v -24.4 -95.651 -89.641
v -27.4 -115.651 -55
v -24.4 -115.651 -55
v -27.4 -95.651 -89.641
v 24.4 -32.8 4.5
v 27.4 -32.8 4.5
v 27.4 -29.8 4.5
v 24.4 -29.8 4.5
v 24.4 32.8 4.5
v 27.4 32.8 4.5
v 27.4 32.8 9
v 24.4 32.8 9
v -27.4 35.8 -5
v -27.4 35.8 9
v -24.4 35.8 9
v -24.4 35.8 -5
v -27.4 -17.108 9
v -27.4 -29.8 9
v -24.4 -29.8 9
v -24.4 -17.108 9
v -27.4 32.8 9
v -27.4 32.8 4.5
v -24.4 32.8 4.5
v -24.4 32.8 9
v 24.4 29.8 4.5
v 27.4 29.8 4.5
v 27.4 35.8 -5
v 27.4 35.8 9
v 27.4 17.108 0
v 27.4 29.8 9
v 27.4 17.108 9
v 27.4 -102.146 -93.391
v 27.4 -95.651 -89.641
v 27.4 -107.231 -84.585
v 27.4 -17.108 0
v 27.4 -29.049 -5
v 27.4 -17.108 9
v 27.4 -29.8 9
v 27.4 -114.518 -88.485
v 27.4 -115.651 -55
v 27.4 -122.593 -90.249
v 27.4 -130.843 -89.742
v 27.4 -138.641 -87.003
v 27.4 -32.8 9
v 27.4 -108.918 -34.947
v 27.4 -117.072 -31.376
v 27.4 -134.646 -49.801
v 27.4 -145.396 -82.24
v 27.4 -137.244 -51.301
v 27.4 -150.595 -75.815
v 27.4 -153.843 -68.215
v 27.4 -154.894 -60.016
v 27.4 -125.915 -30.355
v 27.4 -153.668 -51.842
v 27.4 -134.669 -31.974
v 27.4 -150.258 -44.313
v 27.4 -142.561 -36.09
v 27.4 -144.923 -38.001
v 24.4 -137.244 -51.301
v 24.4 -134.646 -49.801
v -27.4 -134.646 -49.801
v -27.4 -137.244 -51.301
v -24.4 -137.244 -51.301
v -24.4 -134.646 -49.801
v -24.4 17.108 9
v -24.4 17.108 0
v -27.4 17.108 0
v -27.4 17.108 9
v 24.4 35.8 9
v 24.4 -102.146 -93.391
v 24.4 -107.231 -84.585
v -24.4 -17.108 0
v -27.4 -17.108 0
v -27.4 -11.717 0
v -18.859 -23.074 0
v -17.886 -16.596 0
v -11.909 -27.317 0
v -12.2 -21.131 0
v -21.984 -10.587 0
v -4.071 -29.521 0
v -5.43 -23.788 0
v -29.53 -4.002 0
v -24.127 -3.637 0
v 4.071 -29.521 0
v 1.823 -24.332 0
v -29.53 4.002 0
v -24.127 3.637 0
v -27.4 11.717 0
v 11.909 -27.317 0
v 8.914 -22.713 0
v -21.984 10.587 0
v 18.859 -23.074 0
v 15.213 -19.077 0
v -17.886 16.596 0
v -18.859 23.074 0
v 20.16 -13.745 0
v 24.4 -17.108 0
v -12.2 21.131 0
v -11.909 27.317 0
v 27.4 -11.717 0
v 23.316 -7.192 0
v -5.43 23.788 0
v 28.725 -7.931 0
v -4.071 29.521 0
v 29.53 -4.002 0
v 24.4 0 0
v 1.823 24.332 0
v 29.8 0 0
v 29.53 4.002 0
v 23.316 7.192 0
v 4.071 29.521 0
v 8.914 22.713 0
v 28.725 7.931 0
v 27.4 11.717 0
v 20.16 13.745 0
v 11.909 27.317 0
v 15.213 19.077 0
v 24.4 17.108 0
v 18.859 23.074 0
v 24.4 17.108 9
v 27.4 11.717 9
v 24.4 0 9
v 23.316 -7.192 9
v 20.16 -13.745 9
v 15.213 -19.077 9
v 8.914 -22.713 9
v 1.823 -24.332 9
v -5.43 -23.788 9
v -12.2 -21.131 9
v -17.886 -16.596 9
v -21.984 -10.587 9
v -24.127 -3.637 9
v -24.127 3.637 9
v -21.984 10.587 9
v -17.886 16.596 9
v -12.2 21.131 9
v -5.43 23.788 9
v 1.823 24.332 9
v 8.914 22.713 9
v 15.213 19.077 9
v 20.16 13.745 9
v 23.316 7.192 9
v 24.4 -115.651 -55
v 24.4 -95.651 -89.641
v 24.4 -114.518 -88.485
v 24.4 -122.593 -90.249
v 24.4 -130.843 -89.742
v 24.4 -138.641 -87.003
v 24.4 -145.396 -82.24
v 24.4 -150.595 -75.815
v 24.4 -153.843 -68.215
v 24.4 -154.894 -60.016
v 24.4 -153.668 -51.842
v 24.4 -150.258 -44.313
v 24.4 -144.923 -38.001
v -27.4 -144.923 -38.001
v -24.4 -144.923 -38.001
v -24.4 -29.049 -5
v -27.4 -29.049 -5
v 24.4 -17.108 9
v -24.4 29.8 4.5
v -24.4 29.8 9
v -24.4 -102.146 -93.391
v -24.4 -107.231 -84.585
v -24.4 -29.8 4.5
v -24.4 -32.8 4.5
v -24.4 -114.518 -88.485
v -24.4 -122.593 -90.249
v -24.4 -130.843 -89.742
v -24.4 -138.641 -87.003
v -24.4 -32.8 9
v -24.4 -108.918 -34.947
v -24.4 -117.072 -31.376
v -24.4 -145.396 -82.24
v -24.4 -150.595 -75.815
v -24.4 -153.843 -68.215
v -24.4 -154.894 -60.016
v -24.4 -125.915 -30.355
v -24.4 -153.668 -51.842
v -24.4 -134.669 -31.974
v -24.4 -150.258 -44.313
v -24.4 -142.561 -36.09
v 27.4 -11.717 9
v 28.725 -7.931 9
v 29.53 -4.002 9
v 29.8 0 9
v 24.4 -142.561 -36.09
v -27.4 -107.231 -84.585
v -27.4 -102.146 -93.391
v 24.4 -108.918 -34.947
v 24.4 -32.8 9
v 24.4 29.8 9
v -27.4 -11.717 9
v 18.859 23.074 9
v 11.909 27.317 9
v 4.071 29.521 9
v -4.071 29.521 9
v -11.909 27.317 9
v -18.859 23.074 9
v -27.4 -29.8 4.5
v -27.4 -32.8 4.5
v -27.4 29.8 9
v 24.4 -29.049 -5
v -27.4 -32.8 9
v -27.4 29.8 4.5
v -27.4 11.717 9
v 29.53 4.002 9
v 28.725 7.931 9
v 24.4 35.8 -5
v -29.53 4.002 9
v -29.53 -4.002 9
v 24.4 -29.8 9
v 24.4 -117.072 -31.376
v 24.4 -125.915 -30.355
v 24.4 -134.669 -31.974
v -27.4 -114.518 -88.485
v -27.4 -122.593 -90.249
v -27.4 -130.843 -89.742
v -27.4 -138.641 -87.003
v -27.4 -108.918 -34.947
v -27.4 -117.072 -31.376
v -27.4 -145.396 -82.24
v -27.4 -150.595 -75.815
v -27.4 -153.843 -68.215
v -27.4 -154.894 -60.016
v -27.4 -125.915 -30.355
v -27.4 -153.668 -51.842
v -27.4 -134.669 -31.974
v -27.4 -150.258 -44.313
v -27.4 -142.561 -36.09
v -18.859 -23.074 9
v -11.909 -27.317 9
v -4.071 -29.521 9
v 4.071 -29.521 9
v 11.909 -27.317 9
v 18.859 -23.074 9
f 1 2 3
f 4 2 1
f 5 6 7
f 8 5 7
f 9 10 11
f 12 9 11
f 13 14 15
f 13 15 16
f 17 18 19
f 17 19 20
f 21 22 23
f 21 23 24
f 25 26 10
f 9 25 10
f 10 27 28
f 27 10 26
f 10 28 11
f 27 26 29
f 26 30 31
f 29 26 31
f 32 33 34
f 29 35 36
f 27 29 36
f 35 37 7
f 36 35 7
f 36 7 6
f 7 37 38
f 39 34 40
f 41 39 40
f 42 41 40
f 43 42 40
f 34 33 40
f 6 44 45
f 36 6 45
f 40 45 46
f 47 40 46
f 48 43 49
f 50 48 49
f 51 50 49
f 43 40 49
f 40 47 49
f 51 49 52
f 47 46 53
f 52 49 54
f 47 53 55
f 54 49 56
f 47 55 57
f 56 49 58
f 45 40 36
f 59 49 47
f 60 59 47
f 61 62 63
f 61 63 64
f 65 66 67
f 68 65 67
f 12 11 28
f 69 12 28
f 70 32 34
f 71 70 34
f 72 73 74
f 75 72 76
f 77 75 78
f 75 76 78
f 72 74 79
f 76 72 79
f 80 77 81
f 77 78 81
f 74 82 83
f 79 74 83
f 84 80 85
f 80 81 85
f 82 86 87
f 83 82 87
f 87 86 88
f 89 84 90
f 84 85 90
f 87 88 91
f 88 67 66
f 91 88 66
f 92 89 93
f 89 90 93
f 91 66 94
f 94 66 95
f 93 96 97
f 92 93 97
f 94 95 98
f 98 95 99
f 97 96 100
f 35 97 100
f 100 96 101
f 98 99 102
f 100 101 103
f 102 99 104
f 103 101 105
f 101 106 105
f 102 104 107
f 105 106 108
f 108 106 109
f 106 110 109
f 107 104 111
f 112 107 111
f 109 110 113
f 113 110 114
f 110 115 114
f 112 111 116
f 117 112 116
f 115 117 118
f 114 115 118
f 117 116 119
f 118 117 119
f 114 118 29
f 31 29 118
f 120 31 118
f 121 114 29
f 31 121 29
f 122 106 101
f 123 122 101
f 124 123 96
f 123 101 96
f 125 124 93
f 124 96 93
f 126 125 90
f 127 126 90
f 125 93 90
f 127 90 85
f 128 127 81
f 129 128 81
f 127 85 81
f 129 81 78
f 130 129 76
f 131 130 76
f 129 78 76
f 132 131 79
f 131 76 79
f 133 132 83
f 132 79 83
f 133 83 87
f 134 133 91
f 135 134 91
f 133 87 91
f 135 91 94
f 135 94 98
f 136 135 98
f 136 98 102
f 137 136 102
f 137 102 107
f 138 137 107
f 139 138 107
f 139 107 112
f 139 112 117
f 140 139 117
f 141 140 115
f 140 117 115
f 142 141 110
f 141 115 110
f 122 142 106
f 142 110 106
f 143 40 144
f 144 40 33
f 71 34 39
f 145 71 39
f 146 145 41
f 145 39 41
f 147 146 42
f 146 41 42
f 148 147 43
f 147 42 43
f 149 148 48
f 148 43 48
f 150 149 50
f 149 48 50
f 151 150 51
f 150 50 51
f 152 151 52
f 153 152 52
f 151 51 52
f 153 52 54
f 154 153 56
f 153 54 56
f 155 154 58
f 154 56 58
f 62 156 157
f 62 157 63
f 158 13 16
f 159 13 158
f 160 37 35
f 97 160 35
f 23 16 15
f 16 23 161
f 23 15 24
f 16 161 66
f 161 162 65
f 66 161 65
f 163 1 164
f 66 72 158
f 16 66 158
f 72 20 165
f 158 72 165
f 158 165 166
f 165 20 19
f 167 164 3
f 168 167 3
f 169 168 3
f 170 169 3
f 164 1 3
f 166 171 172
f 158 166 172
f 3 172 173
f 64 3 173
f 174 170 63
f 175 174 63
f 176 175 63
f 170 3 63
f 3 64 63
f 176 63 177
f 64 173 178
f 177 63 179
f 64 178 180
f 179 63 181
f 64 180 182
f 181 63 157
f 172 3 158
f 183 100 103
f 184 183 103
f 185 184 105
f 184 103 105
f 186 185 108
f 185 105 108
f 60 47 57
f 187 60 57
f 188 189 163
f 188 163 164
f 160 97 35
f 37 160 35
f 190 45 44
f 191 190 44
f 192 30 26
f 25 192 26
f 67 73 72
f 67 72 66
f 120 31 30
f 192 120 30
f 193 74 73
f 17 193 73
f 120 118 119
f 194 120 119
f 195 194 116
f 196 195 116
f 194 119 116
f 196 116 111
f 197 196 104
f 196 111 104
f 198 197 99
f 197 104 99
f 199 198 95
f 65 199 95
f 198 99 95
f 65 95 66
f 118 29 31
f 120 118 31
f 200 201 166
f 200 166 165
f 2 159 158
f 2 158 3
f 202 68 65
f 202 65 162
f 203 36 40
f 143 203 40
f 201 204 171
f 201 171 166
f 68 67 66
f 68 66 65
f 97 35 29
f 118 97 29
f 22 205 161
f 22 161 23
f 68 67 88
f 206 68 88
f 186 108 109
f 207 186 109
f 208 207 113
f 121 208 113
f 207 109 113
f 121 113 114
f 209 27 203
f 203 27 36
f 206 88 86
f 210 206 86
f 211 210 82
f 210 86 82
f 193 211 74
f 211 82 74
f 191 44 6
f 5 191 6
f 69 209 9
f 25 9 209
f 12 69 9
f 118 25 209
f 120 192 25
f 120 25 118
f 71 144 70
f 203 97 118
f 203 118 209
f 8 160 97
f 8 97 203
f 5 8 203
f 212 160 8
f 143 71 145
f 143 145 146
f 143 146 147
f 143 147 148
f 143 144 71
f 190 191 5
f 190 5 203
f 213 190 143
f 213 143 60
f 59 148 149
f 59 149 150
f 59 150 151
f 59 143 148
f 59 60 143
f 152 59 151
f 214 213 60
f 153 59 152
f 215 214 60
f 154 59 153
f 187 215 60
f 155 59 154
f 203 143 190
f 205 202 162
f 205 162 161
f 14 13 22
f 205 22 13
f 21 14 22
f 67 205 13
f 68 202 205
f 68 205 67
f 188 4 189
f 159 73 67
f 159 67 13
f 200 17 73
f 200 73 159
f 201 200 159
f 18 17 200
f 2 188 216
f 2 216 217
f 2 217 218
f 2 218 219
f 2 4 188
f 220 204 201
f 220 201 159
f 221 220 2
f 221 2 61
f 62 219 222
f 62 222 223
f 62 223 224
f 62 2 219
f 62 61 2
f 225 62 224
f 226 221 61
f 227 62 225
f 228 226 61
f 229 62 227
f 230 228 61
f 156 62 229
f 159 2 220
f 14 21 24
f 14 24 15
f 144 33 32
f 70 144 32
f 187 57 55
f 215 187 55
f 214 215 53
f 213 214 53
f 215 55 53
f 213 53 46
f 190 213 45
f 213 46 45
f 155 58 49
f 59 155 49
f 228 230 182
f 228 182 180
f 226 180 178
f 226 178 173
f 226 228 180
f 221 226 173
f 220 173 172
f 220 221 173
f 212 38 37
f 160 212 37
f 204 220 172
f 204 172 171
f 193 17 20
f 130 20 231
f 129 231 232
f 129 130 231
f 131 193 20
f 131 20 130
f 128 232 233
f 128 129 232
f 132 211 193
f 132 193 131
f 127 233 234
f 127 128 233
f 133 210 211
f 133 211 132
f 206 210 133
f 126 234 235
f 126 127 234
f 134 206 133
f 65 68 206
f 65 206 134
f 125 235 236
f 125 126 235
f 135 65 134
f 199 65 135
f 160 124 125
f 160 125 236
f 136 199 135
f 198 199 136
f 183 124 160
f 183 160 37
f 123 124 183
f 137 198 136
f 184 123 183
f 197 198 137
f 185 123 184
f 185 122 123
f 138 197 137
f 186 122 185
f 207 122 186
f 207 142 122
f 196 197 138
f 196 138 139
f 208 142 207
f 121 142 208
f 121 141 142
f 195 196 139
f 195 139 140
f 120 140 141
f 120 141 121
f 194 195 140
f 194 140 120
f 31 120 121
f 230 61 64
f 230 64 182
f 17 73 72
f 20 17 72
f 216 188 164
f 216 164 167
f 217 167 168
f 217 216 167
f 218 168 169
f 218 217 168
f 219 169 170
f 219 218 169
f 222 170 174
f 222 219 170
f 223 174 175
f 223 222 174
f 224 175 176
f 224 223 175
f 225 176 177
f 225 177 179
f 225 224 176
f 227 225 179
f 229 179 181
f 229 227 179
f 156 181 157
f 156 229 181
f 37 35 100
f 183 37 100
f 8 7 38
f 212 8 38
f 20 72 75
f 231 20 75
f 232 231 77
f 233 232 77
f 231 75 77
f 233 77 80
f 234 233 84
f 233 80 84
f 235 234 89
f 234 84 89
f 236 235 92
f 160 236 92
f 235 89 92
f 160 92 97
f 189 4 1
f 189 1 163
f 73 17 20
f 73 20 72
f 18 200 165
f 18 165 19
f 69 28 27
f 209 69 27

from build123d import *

# Parameters (mm, degrees)
F2_DEPTH = 9
F4_DEPTH = 3


with BuildPart() as f2:
    # F1 (on Top) → F2 (new body)
    with BuildSketch(Plane.XY):
        with BuildLine():
            Line((24.4, 0), (24.4, 17.1078929153))
            ThreePointArc((24.4, 17.1078929153), (0, 29.8), (-24.4, 17.1078929153))
            Line((-24.4, 17.1078929153), (-24.4, 0))
            ThreePointArc((-24.4, 0), (0, 24.4), (24.4, 0))
        make_face()
        with BuildLine():
            Line((27.4, 17.1078929153), (24.4, 17.1078929153))
            ThreePointArc((24.4, 17.1078929153), (26.0398994251, 14.4901220813), (27.4, 11.7166548127))
            Line((27.4, 11.7166548127), (27.4, 17.1078929153))
        make_face()
        with BuildLine():
            ThreePointArc((27.4, 11.7166548127), (26.0398994251, 14.4901220813), (24.4, 17.1078929153))
            Line((24.4, 17.1078929153), (24.4, 0))
            Line((24.4, 0), (24.4, -17.1078929153))
            ThreePointArc((24.4, -17.1078929153), (26.0398994251, -14.4901220813), (27.4, -11.7166548127))
            Line((27.4, -11.7166548127), (27.4, 11.7166548127))
        make_face()
        with BuildLine():
            Line((-24.4, 0), (-24.4, 17.1078929153))
            ThreePointArc((-24.4, 17.1078929153), (-26.0398994251, 14.4901220813), (-27.4, 11.7166548127))
            Line((-27.4, 11.7166548127), (-27.4, -11.7166548127))
            ThreePointArc((-27.4, -11.7166548127), (-26.0398994251, -14.4901220813), (-24.4, -17.1078929153))
            Line((-24.4, -17.1078929153), (-24.4, 0))
        make_face()
        with BuildLine():
            ThreePointArc((-27.4, 11.7166548127), (-26.0398994251, 14.4901220813), (-24.4, 17.1078929153))
            Line((-24.4, 17.1078929153), (-27.4, 17.1078929153))
            Line((-27.4, 17.1078929153), (-27.4, 11.7166548127))
        make_face()
        with BuildLine():
            ThreePointArc((29.8, 0), (29.1938349656, 5.9799665551), (27.4, 11.7166548127))
            Line((27.4, 11.7166548127), (27.4, -11.7166548127))
            ThreePointArc((27.4, -11.7166548127), (29.1938349656, -5.9799665551), (29.8, 0))
        make_face()
        with BuildLine():
            Line((24.4, -17.1078929153), (24.4, 0))
            ThreePointArc((24.4, 0), (0, -24.4), (-24.4, 0))
            Line((-24.4, 0), (-24.4, -17.1078929153))
            ThreePointArc((-24.4, -17.1078929153), (0, -29.8), (24.4, -17.1078929153))
        make_face()
        with BuildLine():
            Line((-27.4, -11.7166548127), (-27.4, 11.7166548127))
            ThreePointArc((-27.4, 11.7166548127), (-29.8, 0), (-27.4, -11.7166548127))
        make_face()
        with BuildLine():
            Line((27.4, -17.1078929153), (27.4, -11.7166548127))
            ThreePointArc((27.4, -11.7166548127), (26.0398994251, -14.4901220813), (24.4, -17.1078929153))
            Line((24.4, -17.1078929153), (27.4, -17.1078929153))
        make_face()
        with BuildLine():
            ThreePointArc((-24.4, -17.1078929153), (-26.0398994251, -14.4901220813), (-27.4, -11.7166548127))
            Line((-27.4, -11.7166548127), (-27.4, -17.1078929153))
            Line((-27.4, -17.1078929153), (-24.4, -17.1078929153))
        make_face()
    extrude(amount=F2_DEPTH)


with BuildPart() as f4:
    # F3 (on face) → F4 (new body)
    with BuildSketch(Plane(origin=(-27.4, 0, 0), x_dir=(0, -1, 0), z_dir=(-1, 0, 0))):
        with BuildLine():
            Line((-17.1078929153, 0), (-17.1078929153, 9))
            Line((-17.1078929153, 9), (-29.8, 9))
            Line((-29.8, 9), (-29.8, 4.5))
            Line((-29.8, 4.5), (-32.8, 4.5))
            Line((-32.8, 4.5), (-32.8, 9))
            Line((-32.8, 9), (-35.8, 9))
            Line((-35.8, 9), (-35.8, 0))
            Line((-35.8, 0), (-35.8, -5))
            Line((-35.8, -5), (29.048711306, -5))
            Line((29.048711306, -5), (98.9153107563, -45.3375))
            ThreePointArc((98.9153107563, -45.3375), (103.282832654, -39.5320236206), (108.9178222837, -34.9466451856))
            Line((108.9178222837, -34.9466451856), (32.8, 9))
            Line((32.8, 9), (32.8, 4.5))
            Line((32.8, 4.5), (29.8, 4.5))
            Line((29.8, 4.5), (29.8, 9))
            Line((29.8, 9), (17.1078929153, 9))
            Line((17.1078929153, 9), (17.1078929153, 0))
            Line((17.1078929153, 0), (0, 0))
            Line((0, 0), (-17.1078929153, 0))
        make_face()
        with BuildLine():
            ThreePointArc((142.5614617627, -36.0901489021), (125.9151455384, -30.354813481), (108.9178222837, -34.9466451856))
            ThreePointArc((108.9178222837, -34.9466451856), (103.282832654, -39.5320236206), (98.9153107563, -45.3375))
            Line((98.9153107563, -45.3375), (115.6512516844, -55))
            Line((115.6512516844, -55), (95.6512516844, -89.6410161514))
            Line((95.6512516844, -89.6410161514), (102.1464422128, -93.3910161514))
            Line((102.1464422128, -93.3910161514), (107.230683977, -84.5848510979))
            ThreePointArc((107.230683977, -84.5848510979), (148.2181164493, -79.2076426405), (144.9225856756, -38.0005623219))
            Line((144.9225856756, -38.0005623219), (137.2437797382, -51.300644347))
            Line((137.2437797382, -51.300644347), (134.6457035268, -49.800644347))
            Line((134.6457035268, -49.800644347), (142.5614617627, -36.0901489021))
        make_face()
    extrude(amount=-F4_DEPTH)


with BuildPart() as f5_1:
    # F5: instance of F4
    add(f4.part.mirror(Plane.YZ))


solid = Compound([f2.part, f4.part, f5_1.part])
